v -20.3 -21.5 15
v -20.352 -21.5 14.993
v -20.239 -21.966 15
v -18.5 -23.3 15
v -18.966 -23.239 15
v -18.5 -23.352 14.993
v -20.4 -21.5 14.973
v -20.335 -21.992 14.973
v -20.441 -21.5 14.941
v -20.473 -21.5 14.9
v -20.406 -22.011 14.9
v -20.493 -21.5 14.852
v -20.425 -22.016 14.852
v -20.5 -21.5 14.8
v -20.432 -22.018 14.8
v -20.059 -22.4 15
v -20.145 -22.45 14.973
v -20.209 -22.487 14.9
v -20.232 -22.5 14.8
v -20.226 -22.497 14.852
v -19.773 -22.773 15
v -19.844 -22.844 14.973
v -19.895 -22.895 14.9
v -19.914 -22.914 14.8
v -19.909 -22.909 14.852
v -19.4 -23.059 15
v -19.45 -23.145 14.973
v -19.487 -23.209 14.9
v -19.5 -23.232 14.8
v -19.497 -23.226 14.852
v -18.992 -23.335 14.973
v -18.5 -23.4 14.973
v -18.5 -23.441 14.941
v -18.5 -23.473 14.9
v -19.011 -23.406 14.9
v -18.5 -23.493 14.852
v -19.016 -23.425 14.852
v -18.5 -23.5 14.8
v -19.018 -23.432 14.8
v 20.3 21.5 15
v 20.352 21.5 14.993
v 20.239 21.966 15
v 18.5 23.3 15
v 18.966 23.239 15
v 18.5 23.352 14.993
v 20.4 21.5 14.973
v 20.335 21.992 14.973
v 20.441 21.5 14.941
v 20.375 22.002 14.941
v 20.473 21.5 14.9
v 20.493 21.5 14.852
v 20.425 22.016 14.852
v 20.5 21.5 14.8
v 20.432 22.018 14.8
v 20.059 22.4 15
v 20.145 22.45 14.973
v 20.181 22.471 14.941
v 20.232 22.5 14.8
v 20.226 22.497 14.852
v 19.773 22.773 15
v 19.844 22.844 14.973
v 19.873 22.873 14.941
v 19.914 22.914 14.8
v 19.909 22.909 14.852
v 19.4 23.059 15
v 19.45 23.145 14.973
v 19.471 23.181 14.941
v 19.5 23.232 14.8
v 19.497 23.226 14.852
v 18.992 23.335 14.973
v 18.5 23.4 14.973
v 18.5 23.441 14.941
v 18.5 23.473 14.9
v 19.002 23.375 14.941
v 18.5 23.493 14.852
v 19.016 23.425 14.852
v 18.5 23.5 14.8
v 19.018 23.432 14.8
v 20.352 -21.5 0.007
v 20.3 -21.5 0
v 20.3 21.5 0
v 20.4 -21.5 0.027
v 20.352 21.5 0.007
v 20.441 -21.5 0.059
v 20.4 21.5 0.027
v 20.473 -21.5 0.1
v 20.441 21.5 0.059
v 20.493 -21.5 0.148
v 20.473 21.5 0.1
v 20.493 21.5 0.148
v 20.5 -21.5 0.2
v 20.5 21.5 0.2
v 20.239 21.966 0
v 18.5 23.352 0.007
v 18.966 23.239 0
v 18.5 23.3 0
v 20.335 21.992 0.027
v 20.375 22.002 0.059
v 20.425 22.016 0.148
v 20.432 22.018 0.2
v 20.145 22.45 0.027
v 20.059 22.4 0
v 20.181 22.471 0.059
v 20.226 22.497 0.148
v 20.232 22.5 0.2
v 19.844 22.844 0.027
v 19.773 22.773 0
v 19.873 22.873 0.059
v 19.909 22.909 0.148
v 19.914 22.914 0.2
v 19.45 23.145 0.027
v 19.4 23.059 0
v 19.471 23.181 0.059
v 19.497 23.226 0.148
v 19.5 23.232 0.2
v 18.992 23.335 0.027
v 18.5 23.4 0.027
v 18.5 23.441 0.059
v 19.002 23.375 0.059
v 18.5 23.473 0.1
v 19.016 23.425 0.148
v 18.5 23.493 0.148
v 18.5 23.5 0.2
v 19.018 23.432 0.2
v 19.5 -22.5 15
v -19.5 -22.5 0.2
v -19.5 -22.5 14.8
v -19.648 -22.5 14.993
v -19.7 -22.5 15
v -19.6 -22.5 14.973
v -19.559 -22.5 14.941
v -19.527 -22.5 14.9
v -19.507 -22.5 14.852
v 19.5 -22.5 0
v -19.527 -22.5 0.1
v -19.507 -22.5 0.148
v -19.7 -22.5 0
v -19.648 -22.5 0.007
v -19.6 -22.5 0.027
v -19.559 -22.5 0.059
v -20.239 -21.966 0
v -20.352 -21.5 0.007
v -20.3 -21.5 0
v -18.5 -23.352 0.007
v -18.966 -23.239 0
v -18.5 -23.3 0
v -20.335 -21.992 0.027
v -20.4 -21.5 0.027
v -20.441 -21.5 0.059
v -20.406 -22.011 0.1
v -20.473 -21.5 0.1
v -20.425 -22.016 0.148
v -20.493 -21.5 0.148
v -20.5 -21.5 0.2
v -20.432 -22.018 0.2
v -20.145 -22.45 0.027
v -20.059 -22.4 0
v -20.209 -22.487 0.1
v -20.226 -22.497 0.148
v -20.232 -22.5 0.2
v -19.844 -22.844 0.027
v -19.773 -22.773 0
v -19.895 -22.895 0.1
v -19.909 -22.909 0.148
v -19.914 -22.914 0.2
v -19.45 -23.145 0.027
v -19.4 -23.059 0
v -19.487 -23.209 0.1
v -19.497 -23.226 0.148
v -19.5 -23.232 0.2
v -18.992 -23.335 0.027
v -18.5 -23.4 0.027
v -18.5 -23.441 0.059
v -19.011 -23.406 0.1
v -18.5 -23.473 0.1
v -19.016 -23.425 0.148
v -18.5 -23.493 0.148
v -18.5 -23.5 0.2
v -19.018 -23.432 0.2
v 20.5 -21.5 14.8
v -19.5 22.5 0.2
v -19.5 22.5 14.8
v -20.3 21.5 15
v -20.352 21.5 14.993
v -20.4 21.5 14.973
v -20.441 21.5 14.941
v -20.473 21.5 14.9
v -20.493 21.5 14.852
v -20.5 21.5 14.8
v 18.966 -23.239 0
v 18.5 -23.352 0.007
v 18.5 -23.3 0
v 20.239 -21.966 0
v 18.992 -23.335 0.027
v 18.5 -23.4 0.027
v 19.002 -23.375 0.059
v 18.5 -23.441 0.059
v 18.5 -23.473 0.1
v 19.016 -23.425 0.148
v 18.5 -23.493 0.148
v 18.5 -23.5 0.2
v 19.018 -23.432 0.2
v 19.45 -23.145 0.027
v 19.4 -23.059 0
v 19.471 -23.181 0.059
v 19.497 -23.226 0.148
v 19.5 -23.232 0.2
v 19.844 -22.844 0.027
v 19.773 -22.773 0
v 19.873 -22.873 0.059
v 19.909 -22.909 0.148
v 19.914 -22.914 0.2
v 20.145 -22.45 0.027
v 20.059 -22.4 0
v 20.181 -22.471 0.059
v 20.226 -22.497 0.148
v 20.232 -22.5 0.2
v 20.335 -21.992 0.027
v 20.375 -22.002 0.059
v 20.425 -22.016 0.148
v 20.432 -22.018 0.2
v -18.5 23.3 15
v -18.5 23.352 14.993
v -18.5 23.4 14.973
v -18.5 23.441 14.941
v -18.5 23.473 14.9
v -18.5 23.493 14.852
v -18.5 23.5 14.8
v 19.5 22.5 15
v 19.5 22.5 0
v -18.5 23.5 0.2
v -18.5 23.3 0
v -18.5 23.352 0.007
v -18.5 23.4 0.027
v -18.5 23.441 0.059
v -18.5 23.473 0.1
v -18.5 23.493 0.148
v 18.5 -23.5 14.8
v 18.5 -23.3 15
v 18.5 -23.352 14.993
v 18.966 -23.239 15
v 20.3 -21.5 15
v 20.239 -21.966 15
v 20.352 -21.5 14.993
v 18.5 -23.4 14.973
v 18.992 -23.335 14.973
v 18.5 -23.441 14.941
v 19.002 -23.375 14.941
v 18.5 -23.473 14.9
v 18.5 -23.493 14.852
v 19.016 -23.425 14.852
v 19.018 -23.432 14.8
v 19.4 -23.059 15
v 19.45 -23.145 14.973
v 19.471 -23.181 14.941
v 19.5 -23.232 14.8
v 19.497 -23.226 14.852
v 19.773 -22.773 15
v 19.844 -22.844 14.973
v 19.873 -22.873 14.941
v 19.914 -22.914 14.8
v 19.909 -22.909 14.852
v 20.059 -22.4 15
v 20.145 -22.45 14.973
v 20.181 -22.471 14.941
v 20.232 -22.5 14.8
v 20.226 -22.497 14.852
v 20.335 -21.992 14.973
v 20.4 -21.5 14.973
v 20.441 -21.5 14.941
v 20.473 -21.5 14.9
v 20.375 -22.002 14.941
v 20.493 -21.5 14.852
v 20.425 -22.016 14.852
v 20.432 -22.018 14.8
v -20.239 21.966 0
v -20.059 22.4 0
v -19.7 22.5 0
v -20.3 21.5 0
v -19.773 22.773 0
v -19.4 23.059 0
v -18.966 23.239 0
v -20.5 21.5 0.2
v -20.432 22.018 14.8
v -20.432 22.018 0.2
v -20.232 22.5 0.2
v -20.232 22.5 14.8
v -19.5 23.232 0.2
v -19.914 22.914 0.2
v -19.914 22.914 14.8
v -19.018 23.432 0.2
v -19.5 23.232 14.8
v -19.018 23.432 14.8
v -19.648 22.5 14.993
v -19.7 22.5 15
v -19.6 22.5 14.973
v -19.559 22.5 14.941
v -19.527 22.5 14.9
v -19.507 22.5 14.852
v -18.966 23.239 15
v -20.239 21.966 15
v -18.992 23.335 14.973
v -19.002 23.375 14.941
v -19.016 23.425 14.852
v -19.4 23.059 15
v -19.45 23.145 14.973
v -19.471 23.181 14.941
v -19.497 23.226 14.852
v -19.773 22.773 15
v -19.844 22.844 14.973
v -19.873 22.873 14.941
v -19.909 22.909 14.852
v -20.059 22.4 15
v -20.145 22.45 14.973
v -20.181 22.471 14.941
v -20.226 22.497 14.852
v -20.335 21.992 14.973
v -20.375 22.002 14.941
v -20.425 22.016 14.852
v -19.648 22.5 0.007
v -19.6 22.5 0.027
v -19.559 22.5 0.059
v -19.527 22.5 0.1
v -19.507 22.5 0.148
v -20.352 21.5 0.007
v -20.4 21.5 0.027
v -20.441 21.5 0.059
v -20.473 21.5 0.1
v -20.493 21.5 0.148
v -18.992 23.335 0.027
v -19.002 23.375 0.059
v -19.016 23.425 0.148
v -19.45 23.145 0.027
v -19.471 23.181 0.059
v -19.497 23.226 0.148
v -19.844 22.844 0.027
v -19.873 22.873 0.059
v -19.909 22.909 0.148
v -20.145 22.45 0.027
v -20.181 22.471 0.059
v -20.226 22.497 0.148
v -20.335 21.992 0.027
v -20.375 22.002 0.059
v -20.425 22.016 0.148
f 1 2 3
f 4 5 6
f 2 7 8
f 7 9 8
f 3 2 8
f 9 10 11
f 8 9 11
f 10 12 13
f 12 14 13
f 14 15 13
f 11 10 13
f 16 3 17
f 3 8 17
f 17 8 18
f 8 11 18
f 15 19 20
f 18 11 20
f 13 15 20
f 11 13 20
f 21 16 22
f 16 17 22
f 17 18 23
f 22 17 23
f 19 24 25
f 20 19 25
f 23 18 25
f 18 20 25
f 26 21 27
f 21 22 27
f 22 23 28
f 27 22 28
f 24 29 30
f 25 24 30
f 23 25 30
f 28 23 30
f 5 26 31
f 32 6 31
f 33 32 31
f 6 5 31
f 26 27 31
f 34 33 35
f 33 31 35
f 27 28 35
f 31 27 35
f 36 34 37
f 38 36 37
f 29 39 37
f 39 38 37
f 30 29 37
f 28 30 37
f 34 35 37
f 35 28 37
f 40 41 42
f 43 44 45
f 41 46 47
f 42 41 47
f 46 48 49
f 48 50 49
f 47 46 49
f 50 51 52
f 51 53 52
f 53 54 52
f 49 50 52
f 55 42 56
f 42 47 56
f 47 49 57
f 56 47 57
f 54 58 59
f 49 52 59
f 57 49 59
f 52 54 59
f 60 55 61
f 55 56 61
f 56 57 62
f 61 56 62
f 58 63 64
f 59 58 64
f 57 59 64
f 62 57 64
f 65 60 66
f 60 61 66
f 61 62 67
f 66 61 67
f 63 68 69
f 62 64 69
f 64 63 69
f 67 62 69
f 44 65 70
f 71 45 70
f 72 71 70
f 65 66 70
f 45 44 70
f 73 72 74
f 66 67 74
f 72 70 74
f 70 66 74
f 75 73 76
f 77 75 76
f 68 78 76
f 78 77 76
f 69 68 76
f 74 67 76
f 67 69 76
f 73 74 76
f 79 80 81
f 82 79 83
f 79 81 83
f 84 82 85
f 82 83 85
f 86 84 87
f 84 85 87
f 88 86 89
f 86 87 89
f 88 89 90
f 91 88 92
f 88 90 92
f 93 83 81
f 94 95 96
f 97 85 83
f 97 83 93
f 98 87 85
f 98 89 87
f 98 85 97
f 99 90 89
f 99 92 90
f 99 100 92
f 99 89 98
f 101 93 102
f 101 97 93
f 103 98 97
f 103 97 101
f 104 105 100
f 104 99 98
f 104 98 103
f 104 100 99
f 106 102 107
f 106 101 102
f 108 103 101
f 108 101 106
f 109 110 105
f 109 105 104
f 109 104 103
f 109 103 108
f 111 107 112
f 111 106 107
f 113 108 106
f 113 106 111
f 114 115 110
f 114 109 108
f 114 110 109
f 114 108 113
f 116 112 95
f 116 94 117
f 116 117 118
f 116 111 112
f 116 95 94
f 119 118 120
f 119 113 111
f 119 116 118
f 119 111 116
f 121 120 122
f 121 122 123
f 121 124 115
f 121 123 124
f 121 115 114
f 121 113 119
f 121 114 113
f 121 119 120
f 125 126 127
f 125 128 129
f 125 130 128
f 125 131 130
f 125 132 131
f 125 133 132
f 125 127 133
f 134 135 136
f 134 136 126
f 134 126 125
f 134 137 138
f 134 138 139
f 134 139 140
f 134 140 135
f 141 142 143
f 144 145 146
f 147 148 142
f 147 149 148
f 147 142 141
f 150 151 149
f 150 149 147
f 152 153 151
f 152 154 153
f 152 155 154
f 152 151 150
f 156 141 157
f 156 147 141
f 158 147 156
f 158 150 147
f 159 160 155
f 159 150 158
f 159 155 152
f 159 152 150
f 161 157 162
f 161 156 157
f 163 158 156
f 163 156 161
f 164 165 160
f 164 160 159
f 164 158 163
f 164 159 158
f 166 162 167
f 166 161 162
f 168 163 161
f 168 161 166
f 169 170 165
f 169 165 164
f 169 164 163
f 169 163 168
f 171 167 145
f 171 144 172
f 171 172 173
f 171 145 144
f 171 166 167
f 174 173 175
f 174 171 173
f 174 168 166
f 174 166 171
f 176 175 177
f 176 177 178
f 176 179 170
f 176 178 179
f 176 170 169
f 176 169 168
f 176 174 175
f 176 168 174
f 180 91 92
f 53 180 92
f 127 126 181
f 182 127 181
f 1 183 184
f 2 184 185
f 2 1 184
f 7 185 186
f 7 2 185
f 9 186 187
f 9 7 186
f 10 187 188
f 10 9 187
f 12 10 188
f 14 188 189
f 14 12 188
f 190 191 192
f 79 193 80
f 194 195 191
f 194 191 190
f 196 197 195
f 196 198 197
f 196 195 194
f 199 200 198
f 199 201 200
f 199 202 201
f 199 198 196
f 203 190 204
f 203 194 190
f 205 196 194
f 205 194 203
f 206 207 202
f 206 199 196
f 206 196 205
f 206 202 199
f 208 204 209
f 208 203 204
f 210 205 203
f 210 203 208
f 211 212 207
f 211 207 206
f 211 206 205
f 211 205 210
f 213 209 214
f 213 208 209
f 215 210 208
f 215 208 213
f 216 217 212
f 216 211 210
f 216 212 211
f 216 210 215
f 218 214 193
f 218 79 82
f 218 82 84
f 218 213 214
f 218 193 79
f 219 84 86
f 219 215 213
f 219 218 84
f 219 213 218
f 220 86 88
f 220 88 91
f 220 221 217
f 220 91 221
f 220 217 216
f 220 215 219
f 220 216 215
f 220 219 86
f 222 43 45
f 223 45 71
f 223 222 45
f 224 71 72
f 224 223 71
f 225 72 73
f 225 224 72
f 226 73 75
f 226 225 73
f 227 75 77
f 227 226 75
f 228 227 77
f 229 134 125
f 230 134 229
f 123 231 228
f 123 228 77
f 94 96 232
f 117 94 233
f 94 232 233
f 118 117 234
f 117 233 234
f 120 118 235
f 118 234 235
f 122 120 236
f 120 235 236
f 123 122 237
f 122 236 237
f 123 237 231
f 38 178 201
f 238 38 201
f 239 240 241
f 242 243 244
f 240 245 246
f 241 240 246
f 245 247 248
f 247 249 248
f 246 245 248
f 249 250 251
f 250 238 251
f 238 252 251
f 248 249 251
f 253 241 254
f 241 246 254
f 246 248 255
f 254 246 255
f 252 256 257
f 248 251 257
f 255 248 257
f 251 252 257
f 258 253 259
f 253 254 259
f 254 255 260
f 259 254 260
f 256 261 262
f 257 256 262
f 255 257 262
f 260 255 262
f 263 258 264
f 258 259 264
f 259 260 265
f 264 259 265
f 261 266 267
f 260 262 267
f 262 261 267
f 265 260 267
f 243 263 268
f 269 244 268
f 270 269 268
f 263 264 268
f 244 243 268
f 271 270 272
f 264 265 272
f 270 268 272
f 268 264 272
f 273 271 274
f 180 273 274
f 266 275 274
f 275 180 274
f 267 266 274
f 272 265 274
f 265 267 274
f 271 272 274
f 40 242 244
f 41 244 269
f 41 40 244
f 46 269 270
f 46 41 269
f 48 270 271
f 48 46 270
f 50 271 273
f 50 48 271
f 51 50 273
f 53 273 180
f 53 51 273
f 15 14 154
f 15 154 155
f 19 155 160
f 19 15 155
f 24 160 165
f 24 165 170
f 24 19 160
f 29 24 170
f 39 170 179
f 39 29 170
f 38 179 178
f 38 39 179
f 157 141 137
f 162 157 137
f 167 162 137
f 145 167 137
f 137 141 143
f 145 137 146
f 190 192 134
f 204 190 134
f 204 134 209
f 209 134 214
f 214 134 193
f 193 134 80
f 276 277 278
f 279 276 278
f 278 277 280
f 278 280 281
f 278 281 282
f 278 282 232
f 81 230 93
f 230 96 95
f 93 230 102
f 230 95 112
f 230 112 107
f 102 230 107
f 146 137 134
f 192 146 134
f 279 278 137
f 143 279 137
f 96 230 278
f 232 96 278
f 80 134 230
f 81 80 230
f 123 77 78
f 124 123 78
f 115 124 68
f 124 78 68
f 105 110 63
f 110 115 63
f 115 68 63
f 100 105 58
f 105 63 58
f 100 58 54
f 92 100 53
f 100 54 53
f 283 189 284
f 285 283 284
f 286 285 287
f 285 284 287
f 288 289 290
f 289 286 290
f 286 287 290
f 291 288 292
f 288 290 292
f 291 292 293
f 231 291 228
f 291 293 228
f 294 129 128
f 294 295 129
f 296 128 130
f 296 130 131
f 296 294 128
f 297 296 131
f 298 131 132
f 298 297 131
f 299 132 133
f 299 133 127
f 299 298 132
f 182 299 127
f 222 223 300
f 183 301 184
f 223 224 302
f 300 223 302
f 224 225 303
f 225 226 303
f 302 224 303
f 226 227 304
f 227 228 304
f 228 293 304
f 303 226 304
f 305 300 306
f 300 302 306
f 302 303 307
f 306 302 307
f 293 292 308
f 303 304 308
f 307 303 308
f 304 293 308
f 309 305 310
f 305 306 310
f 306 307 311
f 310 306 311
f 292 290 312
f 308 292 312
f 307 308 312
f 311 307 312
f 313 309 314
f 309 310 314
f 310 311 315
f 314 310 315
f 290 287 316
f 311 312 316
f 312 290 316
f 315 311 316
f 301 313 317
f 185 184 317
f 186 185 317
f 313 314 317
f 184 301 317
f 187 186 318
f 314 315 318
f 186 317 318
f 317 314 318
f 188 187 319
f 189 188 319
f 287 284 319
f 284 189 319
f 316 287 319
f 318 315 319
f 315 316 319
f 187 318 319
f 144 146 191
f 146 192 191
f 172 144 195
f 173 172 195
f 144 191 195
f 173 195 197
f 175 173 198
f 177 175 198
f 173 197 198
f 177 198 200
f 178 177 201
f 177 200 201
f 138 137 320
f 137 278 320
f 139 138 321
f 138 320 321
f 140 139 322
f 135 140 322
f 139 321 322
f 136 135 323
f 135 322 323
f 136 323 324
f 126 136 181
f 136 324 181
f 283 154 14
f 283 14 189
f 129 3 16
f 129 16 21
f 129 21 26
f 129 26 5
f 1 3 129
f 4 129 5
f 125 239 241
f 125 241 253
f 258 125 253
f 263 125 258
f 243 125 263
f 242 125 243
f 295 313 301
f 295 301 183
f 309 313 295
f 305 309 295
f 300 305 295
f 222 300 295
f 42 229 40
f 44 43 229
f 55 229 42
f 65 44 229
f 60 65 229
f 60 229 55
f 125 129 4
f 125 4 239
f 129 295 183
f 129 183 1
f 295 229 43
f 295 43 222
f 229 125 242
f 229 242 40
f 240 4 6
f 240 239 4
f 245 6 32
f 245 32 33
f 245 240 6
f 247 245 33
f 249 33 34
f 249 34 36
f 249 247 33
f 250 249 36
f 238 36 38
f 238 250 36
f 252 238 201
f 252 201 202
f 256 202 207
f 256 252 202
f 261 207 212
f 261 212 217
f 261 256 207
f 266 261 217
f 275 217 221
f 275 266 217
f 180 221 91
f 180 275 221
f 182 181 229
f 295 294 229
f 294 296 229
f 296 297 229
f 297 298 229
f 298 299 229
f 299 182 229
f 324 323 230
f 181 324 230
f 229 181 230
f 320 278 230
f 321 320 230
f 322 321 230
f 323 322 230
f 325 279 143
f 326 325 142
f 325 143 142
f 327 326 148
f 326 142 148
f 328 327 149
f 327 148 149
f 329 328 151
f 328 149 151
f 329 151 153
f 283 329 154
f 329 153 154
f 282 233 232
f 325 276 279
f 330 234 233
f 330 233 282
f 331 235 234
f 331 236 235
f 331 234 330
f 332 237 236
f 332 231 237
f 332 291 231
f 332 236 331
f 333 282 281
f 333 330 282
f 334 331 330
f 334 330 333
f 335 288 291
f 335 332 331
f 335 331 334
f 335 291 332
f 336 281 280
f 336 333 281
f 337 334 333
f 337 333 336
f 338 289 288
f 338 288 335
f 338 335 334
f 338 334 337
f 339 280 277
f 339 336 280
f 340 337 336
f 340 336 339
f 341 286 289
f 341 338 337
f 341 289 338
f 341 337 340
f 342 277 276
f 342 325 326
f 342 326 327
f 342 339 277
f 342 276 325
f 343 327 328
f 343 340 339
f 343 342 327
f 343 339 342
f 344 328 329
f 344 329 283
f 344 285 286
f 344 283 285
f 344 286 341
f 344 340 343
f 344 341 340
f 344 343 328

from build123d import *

# Parameters (mm, degrees)
SKETCH1_W           = 41
SKETCH1_H           = 47
SKETCH1_W_2         = 39
SKETCH1_H_2         = 45
BOSS_EXTRUDE1_DEPTH = 15
FILLET1_R           = 2
FILLET4_R           = 0.2


with BuildPart() as part:
    # Sketch1 → Boss-Extrude1 (new body)
    with BuildSketch(Plane.XY):
        Rectangle(SKETCH1_W, SKETCH1_H)
        Rectangle(SKETCH1_W_2, SKETCH1_H_2, mode=Mode.SUBTRACT)
    extrude(amount=BOSS_EXTRUDE1_DEPTH)

    # Fillet1
    fillet1_edges = [part.edges().sort_by_distance(p)[0] for p in [
        (-20.5, -23.5, 7.5),
        (-20.5, 23.5, 7.5),
        (20.5, 23.5, 7.5),
        (20.5, -23.5, 7.5),
    ]]
    fillet(fillet1_edges, radius=FILLET1_R)

    # Fillet4
    fillet4_edges = [part.edges().sort_by_distance(p)[0] for p in [
        (-19.5, 0, 0),
        (-19.5, 0, 15),
        (0, -23.5, 0),
        (0, -23.5, 15),
        (-20.5, 0, 0),
        (0, 23.5, 0),
        (20.5, 0, 0),
        (-19.914213562, 22.914213562, 0),
        (19.914213562, 22.914213562, 0),
        (19.914213562, -22.914213562, 0),
        (-19.914213562, -22.914213562, 0),
        (-20.5, 0, 15),
        (20.5, 0, 15),
        (0, 23.5, 15),
        (-19.914213562, 22.914213562, 15),
        (19.914213562, 22.914213562, 15),
        (19.914213562, -22.914213562, 15),
        (-19.914213562, -22.914213562, 15),
    ]]
    fillet(fillet4_edges, radius=FILLET4_R)


solid = part.part
